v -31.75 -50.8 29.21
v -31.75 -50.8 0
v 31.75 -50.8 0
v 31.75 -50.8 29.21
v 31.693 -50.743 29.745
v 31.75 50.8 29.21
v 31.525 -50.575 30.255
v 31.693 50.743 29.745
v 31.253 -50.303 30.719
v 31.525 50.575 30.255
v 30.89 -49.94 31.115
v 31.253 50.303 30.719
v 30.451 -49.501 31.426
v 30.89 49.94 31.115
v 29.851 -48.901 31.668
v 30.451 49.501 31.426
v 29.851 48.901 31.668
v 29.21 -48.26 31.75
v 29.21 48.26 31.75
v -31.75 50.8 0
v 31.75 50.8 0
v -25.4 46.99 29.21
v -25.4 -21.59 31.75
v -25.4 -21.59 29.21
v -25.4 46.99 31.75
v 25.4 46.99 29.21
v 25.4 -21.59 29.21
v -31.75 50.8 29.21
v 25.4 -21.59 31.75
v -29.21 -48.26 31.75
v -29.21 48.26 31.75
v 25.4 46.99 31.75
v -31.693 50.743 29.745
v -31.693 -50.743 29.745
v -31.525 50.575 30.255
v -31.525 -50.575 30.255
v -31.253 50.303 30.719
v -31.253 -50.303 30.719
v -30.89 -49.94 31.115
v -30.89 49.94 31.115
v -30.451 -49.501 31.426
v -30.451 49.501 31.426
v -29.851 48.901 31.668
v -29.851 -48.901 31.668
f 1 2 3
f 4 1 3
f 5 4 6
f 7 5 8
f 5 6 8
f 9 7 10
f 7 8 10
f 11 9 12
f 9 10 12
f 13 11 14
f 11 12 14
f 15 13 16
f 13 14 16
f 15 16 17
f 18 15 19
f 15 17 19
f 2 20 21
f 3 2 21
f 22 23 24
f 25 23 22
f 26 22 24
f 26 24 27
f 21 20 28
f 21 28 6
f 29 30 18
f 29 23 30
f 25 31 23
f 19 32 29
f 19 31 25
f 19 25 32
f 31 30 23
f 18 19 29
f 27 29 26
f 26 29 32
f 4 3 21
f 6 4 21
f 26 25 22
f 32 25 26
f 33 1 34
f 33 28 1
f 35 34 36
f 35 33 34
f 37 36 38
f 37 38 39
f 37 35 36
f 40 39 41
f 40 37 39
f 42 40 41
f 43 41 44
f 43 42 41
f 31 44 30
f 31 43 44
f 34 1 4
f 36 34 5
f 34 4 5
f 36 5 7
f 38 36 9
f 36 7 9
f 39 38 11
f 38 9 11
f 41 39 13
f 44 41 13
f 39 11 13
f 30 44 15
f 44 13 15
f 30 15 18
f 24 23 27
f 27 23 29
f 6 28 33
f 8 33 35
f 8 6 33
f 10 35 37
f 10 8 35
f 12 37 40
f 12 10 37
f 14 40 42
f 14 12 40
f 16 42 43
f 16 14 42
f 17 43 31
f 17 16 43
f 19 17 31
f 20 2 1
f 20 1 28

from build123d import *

# Parameters (mm, degrees)
F0_W     = 63.5
F0_H     = 101.6
F1_DEPTH = 31.75
F2_R     = 2.54
F3_W     = 50.8
F3_H     = 68.58
F4_DEPTH = 2.54


with BuildPart() as f1:
    # F0 (on Top) → F1 (new body)
    with BuildSketch(Plane.XY):
        Rectangle(F0_W, F0_H)
    extrude(amount=F1_DEPTH)

    # F2
    f2_edges = [f1.edges().sort_by_distance(p)[0] for p in [
        (0, 50.8, 31.75),
        (-31.75, 0, 31.75),
        (31.75, 0, 31.75),
        (0, -50.8, 31.75),
    ]]
    fillet(f2_edges, radius=F2_R)

    # F3 (on face) → F4 (cut)
    with BuildSketch(Plane.XY.offset(31.75)):
        with Locations((0, 12.7)):
            Rectangle(F3_W, F3_H)
    extrude(amount=-F4_DEPTH, mode=Mode.SUBTRACT)


solid = f1.part
